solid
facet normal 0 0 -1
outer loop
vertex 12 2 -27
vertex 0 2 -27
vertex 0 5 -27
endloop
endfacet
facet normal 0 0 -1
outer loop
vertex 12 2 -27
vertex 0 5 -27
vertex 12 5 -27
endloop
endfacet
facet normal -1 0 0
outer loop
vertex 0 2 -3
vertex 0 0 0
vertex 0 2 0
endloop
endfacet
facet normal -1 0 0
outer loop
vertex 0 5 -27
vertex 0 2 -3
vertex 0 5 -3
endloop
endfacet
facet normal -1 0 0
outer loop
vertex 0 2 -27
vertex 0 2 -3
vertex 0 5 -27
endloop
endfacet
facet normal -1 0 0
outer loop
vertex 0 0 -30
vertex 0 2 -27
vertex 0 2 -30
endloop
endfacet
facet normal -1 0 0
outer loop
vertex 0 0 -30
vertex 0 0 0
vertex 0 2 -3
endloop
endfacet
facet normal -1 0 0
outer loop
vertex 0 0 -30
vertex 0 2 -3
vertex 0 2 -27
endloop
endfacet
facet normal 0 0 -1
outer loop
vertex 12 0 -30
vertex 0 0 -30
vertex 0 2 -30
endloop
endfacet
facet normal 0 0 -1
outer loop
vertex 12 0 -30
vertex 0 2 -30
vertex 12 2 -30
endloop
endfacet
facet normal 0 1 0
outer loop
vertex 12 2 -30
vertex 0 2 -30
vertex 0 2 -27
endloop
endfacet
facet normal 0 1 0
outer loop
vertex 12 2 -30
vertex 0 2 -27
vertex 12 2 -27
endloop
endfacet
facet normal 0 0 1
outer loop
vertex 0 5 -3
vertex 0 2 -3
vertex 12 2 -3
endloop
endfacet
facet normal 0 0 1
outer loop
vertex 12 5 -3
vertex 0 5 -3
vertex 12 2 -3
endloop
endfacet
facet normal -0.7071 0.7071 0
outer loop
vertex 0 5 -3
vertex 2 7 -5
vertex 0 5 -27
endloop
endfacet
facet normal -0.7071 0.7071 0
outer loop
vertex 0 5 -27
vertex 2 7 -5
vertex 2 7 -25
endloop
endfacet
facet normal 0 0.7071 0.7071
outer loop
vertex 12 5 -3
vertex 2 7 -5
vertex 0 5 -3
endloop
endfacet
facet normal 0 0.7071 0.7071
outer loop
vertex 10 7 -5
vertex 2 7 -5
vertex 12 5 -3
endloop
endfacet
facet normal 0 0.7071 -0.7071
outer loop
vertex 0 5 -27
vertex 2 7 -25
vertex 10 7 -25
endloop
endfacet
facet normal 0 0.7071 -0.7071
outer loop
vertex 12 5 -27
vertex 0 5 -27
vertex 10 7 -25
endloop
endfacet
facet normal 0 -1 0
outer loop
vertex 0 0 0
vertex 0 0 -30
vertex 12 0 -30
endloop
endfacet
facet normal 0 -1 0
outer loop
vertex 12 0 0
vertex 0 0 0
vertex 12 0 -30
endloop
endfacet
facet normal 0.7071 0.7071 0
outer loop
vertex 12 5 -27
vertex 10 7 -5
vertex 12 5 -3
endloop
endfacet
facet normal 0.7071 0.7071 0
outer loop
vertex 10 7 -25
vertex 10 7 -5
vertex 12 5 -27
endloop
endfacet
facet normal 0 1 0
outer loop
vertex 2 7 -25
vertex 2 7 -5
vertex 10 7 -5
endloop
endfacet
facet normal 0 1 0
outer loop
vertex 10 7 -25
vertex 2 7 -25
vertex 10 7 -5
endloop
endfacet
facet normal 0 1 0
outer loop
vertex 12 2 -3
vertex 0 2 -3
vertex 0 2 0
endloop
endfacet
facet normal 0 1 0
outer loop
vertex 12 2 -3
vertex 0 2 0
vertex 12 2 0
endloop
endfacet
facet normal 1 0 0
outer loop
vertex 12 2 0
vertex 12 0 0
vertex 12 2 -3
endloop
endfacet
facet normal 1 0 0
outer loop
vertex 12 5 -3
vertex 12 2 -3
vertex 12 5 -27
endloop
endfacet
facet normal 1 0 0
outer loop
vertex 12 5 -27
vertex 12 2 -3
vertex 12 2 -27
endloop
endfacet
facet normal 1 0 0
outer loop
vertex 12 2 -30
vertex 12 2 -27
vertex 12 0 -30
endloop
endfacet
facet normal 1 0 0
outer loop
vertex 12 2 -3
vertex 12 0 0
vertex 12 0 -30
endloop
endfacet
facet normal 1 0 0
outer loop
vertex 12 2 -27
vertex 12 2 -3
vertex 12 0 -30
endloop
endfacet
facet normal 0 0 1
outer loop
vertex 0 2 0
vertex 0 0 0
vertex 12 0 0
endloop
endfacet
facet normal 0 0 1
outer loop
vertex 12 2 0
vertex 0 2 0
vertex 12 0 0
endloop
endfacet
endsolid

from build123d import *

# Parameters (mm, degrees)
SKETCH1_W           = 12
SKETCH1_H           = 30
BOSS_EXTRUDE1_DEPTH = 2
SKETCH2_W           = 12
SKETCH2_H           = 24
BOSS_EXTRUDE2_DEPTH = 5
CHAMFER1_SIZE       = 2


with BuildPart() as part:
    # Sketch1 → Boss-Extrude1 (new body)
    with BuildSketch(Plane(origin=(0, 0, 0), x_dir=(1, 0, 0), z_dir=(0, 1, 0))):
        with Locations((6, 15)):
            Rectangle(SKETCH1_W, SKETCH1_H)
    extrude(amount=BOSS_EXTRUDE1_DEPTH)

    # Sketch2 → Boss-Extrude2 (add)
    with BuildSketch(Plane(origin=(0, 2, 0), x_dir=(1, 0, 0), z_dir=(0, 1, 0))):
        with Locations((6, 15)):
            Rectangle(SKETCH2_W, SKETCH2_H)
    extrude(amount=BOSS_EXTRUDE2_DEPTH)

    # Chamfer1
    chamfer1_edges = [part.edges().sort_by_distance(p)[0] for p in [
        (0, 7, -15),
        (6, 7, -3),
        (12, 7, -15),
        (6, 7, -27),
    ]]
    chamfer(chamfer1_edges, length=CHAMFER1_SIZE)


solid = part.part
